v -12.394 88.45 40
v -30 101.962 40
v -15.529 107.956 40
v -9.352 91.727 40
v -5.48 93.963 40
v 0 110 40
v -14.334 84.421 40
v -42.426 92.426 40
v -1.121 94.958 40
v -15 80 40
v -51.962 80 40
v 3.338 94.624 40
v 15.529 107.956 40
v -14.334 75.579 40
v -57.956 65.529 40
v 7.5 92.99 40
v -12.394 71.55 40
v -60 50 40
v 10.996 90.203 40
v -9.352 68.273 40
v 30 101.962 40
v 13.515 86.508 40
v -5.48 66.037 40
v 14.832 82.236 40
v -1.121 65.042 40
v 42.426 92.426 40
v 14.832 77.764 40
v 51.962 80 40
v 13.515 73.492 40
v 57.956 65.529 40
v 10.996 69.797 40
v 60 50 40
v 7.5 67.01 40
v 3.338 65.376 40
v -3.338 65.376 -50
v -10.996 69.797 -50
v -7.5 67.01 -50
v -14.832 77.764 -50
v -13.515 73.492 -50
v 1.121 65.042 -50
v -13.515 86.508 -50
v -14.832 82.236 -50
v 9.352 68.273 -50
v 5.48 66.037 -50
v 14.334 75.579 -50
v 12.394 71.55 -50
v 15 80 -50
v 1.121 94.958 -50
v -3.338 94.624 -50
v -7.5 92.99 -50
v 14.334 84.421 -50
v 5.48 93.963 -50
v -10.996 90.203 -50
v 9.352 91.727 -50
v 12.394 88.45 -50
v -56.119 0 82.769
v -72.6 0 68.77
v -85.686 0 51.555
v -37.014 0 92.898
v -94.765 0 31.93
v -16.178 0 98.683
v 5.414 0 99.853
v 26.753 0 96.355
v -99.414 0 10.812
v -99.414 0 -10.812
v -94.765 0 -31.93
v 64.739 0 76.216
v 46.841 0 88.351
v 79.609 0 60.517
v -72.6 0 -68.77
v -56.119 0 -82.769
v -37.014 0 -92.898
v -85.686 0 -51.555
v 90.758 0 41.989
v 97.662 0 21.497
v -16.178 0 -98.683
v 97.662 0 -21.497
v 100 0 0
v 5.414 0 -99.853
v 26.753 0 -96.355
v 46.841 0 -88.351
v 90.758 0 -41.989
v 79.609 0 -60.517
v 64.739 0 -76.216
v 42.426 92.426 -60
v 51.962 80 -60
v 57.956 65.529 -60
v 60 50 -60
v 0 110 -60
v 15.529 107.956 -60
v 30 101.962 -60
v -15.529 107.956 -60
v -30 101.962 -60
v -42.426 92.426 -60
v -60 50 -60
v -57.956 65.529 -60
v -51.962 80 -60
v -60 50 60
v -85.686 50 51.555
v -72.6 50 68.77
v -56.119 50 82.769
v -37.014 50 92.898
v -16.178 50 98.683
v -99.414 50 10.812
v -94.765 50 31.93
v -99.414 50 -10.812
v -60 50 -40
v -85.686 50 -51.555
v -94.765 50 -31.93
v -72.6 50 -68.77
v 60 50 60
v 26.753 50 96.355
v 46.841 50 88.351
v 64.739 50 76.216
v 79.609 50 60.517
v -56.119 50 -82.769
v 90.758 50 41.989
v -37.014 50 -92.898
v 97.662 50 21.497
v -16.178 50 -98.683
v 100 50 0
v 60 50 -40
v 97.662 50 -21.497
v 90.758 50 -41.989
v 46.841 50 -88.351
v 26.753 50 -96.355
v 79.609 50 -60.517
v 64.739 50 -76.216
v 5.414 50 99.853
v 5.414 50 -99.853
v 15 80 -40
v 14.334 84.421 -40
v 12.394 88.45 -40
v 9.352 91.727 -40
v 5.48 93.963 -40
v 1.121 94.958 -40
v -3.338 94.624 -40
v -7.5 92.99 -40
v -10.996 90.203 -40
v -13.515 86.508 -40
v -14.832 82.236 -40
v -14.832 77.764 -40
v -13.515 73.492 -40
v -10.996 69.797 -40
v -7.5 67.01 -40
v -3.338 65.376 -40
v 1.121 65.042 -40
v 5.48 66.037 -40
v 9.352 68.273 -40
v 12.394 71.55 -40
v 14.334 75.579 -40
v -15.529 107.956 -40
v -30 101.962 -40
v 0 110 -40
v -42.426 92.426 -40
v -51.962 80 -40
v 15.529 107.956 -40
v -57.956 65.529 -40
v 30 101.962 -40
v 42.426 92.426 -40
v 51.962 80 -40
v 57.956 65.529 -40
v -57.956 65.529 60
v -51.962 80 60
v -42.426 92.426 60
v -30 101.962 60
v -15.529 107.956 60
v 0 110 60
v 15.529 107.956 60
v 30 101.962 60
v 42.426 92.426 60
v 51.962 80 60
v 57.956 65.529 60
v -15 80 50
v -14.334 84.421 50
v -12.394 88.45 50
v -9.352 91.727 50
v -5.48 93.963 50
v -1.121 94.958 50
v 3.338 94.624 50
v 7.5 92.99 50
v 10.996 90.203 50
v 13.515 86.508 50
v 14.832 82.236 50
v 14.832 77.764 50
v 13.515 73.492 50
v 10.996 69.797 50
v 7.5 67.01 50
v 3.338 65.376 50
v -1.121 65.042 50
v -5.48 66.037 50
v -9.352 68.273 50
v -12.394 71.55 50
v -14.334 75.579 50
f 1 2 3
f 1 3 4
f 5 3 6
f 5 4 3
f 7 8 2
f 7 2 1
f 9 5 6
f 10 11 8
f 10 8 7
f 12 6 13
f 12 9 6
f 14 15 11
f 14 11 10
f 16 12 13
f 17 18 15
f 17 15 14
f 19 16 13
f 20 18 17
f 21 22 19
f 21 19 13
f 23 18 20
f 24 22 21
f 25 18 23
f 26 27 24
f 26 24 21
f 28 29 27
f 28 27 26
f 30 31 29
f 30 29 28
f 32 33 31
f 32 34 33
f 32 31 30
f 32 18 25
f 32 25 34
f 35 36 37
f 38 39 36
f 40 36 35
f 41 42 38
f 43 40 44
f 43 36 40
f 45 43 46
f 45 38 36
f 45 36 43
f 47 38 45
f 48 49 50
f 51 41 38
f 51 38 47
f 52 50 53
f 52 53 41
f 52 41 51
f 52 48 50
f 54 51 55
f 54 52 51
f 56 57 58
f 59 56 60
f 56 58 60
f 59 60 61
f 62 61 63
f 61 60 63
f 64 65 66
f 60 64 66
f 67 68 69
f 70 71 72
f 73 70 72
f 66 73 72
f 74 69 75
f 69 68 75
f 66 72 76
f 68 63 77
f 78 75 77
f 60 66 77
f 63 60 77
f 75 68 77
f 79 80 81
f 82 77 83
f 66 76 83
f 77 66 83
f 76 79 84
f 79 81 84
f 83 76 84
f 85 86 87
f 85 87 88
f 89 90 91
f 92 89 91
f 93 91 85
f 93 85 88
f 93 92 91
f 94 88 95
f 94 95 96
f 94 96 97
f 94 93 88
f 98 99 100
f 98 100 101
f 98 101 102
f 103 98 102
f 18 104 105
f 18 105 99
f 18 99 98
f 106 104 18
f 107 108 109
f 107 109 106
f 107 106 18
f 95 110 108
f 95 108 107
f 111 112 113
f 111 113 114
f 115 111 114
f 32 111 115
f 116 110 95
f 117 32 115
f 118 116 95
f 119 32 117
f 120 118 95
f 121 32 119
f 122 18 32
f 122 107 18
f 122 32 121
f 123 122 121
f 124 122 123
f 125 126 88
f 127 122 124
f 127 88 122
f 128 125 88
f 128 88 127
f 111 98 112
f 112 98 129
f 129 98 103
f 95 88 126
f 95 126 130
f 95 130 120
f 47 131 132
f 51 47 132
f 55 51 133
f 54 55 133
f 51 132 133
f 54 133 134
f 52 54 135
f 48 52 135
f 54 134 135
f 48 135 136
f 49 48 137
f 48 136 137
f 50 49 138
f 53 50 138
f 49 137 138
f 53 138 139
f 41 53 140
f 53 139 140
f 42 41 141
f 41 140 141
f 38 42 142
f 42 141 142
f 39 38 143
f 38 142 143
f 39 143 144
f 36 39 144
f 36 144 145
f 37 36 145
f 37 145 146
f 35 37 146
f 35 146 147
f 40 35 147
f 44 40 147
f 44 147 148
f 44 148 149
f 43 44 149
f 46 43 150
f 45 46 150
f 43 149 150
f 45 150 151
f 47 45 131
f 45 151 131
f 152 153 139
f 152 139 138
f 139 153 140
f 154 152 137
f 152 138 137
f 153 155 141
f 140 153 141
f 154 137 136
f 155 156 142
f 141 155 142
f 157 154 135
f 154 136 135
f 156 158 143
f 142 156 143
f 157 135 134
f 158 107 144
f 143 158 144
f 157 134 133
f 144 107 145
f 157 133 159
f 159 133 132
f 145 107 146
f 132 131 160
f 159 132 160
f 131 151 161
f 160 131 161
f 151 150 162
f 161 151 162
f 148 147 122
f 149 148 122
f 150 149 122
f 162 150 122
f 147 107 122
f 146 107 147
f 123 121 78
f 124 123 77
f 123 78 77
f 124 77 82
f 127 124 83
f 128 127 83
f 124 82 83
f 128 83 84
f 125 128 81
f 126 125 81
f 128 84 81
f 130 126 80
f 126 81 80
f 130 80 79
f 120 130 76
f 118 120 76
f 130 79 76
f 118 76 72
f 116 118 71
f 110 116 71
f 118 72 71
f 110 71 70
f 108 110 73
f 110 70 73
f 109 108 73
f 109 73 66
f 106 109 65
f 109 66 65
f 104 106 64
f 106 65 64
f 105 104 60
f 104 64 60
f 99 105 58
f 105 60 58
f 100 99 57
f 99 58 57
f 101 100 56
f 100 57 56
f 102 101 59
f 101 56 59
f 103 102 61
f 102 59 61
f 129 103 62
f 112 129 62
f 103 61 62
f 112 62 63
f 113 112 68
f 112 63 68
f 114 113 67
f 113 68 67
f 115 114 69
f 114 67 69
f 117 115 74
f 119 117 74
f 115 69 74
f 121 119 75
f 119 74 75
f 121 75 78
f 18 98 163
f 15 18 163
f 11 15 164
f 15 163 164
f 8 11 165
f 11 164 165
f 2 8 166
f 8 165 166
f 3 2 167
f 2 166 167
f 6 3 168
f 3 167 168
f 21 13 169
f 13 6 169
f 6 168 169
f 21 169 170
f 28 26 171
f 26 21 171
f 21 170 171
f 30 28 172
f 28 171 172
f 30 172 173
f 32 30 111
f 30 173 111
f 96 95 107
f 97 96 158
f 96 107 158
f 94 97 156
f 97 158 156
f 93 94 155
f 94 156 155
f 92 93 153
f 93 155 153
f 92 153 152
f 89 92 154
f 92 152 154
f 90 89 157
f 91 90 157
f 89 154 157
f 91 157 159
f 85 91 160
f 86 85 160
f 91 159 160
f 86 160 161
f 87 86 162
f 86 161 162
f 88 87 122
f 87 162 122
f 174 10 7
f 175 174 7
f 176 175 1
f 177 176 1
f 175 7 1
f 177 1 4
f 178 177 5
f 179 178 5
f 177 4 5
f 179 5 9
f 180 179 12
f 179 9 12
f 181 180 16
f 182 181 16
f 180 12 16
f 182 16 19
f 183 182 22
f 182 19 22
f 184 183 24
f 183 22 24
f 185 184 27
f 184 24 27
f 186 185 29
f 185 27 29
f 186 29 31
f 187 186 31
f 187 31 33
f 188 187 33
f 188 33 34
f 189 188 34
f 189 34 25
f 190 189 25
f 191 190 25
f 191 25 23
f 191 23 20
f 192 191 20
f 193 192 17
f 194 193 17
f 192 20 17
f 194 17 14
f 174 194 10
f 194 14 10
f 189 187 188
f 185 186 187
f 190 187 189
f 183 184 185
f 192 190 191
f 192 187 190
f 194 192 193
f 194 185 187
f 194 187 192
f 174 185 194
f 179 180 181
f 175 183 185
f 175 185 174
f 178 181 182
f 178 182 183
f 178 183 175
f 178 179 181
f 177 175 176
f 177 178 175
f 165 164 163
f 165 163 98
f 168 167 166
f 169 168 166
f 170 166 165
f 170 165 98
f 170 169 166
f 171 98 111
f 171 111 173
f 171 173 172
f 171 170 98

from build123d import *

# Parameters (mm, degrees)
SKETCH1_R           = 100
BOSS_EXTRUDE1_DEPTH = 50
BOSS_EXTRUDE2_DEPTH = 60
BOSS_EXTRUDE4_DEPTH = 60
SKETCH9_W           = 120
SKETCH9_H           = 80
CUT_EXTRUDE1_DEPTH  = 68
SKETCH15_R          = 15
CUT_EXTRUDE3_DEPTH  = 10
SKETCH19_R          = 15
CUT_EXTRUDE4_DEPTH  = 10


with BuildPart() as part:
    # Sketch1 → Boss-Extrude1 (new body)
    with BuildSketch(Plane(origin=(0, 0, 0), x_dir=(1, 0, 0), z_dir=(0, 1, 0))):
        Circle(SKETCH1_R)
    extrude(amount=BOSS_EXTRUDE1_DEPTH)

    # Sketch2 → Boss-Extrude2 (add)
    with BuildSketch(Plane.XY):
        with BuildLine():
            Line((-60, 50), (0, 50))
            Line((0, 50), (60, 50))
            ThreePointArc((60, 50), (0, 110), (-60, 50))
        make_face()
    extrude(amount=BOSS_EXTRUDE2_DEPTH)

    # Sketch6 → Boss-Extrude4 (add)
    with BuildSketch(Plane(origin=(0, 0, 0), x_dir=(-1, 0, 0), z_dir=(0, 0, -1))):
        with BuildLine():
            Line((-60, 50), (60, 50))
            ThreePointArc((60, 50), (0, 110), (-60, 50))
        make_face()
    extrude(amount=BOSS_EXTRUDE4_DEPTH)

    # Sketch9 → Cut-Extrude1 (cut)
    with BuildSketch(Plane(origin=(0, 50, 0), x_dir=(1, 0, 0), z_dir=(0, 1, 0))):
        Rectangle(SKETCH9_W, SKETCH9_H)
    extrude(amount=CUT_EXTRUDE1_DEPTH, mode=Mode.SUBTRACT)

    # Sketch15 → Cut-Extrude3 (cut)
    with BuildSketch(Plane(origin=(0, 0, 40), x_dir=(-1, 0, 0), z_dir=(0, 0, -1))):
        with Locations((0, 80)):
            Circle(SKETCH15_R)
    extrude(amount=-CUT_EXTRUDE3_DEPTH, mode=Mode.SUBTRACT)

    # Sketch19 → Cut-Extrude4 (cut)
    with BuildSketch(Plane.XY.offset(-40)):
        with Locations((0, 80)):
            Circle(SKETCH19_R)
    extrude(amount=-CUT_EXTRUDE4_DEPTH, mode=Mode.SUBTRACT)


solid = part.part
